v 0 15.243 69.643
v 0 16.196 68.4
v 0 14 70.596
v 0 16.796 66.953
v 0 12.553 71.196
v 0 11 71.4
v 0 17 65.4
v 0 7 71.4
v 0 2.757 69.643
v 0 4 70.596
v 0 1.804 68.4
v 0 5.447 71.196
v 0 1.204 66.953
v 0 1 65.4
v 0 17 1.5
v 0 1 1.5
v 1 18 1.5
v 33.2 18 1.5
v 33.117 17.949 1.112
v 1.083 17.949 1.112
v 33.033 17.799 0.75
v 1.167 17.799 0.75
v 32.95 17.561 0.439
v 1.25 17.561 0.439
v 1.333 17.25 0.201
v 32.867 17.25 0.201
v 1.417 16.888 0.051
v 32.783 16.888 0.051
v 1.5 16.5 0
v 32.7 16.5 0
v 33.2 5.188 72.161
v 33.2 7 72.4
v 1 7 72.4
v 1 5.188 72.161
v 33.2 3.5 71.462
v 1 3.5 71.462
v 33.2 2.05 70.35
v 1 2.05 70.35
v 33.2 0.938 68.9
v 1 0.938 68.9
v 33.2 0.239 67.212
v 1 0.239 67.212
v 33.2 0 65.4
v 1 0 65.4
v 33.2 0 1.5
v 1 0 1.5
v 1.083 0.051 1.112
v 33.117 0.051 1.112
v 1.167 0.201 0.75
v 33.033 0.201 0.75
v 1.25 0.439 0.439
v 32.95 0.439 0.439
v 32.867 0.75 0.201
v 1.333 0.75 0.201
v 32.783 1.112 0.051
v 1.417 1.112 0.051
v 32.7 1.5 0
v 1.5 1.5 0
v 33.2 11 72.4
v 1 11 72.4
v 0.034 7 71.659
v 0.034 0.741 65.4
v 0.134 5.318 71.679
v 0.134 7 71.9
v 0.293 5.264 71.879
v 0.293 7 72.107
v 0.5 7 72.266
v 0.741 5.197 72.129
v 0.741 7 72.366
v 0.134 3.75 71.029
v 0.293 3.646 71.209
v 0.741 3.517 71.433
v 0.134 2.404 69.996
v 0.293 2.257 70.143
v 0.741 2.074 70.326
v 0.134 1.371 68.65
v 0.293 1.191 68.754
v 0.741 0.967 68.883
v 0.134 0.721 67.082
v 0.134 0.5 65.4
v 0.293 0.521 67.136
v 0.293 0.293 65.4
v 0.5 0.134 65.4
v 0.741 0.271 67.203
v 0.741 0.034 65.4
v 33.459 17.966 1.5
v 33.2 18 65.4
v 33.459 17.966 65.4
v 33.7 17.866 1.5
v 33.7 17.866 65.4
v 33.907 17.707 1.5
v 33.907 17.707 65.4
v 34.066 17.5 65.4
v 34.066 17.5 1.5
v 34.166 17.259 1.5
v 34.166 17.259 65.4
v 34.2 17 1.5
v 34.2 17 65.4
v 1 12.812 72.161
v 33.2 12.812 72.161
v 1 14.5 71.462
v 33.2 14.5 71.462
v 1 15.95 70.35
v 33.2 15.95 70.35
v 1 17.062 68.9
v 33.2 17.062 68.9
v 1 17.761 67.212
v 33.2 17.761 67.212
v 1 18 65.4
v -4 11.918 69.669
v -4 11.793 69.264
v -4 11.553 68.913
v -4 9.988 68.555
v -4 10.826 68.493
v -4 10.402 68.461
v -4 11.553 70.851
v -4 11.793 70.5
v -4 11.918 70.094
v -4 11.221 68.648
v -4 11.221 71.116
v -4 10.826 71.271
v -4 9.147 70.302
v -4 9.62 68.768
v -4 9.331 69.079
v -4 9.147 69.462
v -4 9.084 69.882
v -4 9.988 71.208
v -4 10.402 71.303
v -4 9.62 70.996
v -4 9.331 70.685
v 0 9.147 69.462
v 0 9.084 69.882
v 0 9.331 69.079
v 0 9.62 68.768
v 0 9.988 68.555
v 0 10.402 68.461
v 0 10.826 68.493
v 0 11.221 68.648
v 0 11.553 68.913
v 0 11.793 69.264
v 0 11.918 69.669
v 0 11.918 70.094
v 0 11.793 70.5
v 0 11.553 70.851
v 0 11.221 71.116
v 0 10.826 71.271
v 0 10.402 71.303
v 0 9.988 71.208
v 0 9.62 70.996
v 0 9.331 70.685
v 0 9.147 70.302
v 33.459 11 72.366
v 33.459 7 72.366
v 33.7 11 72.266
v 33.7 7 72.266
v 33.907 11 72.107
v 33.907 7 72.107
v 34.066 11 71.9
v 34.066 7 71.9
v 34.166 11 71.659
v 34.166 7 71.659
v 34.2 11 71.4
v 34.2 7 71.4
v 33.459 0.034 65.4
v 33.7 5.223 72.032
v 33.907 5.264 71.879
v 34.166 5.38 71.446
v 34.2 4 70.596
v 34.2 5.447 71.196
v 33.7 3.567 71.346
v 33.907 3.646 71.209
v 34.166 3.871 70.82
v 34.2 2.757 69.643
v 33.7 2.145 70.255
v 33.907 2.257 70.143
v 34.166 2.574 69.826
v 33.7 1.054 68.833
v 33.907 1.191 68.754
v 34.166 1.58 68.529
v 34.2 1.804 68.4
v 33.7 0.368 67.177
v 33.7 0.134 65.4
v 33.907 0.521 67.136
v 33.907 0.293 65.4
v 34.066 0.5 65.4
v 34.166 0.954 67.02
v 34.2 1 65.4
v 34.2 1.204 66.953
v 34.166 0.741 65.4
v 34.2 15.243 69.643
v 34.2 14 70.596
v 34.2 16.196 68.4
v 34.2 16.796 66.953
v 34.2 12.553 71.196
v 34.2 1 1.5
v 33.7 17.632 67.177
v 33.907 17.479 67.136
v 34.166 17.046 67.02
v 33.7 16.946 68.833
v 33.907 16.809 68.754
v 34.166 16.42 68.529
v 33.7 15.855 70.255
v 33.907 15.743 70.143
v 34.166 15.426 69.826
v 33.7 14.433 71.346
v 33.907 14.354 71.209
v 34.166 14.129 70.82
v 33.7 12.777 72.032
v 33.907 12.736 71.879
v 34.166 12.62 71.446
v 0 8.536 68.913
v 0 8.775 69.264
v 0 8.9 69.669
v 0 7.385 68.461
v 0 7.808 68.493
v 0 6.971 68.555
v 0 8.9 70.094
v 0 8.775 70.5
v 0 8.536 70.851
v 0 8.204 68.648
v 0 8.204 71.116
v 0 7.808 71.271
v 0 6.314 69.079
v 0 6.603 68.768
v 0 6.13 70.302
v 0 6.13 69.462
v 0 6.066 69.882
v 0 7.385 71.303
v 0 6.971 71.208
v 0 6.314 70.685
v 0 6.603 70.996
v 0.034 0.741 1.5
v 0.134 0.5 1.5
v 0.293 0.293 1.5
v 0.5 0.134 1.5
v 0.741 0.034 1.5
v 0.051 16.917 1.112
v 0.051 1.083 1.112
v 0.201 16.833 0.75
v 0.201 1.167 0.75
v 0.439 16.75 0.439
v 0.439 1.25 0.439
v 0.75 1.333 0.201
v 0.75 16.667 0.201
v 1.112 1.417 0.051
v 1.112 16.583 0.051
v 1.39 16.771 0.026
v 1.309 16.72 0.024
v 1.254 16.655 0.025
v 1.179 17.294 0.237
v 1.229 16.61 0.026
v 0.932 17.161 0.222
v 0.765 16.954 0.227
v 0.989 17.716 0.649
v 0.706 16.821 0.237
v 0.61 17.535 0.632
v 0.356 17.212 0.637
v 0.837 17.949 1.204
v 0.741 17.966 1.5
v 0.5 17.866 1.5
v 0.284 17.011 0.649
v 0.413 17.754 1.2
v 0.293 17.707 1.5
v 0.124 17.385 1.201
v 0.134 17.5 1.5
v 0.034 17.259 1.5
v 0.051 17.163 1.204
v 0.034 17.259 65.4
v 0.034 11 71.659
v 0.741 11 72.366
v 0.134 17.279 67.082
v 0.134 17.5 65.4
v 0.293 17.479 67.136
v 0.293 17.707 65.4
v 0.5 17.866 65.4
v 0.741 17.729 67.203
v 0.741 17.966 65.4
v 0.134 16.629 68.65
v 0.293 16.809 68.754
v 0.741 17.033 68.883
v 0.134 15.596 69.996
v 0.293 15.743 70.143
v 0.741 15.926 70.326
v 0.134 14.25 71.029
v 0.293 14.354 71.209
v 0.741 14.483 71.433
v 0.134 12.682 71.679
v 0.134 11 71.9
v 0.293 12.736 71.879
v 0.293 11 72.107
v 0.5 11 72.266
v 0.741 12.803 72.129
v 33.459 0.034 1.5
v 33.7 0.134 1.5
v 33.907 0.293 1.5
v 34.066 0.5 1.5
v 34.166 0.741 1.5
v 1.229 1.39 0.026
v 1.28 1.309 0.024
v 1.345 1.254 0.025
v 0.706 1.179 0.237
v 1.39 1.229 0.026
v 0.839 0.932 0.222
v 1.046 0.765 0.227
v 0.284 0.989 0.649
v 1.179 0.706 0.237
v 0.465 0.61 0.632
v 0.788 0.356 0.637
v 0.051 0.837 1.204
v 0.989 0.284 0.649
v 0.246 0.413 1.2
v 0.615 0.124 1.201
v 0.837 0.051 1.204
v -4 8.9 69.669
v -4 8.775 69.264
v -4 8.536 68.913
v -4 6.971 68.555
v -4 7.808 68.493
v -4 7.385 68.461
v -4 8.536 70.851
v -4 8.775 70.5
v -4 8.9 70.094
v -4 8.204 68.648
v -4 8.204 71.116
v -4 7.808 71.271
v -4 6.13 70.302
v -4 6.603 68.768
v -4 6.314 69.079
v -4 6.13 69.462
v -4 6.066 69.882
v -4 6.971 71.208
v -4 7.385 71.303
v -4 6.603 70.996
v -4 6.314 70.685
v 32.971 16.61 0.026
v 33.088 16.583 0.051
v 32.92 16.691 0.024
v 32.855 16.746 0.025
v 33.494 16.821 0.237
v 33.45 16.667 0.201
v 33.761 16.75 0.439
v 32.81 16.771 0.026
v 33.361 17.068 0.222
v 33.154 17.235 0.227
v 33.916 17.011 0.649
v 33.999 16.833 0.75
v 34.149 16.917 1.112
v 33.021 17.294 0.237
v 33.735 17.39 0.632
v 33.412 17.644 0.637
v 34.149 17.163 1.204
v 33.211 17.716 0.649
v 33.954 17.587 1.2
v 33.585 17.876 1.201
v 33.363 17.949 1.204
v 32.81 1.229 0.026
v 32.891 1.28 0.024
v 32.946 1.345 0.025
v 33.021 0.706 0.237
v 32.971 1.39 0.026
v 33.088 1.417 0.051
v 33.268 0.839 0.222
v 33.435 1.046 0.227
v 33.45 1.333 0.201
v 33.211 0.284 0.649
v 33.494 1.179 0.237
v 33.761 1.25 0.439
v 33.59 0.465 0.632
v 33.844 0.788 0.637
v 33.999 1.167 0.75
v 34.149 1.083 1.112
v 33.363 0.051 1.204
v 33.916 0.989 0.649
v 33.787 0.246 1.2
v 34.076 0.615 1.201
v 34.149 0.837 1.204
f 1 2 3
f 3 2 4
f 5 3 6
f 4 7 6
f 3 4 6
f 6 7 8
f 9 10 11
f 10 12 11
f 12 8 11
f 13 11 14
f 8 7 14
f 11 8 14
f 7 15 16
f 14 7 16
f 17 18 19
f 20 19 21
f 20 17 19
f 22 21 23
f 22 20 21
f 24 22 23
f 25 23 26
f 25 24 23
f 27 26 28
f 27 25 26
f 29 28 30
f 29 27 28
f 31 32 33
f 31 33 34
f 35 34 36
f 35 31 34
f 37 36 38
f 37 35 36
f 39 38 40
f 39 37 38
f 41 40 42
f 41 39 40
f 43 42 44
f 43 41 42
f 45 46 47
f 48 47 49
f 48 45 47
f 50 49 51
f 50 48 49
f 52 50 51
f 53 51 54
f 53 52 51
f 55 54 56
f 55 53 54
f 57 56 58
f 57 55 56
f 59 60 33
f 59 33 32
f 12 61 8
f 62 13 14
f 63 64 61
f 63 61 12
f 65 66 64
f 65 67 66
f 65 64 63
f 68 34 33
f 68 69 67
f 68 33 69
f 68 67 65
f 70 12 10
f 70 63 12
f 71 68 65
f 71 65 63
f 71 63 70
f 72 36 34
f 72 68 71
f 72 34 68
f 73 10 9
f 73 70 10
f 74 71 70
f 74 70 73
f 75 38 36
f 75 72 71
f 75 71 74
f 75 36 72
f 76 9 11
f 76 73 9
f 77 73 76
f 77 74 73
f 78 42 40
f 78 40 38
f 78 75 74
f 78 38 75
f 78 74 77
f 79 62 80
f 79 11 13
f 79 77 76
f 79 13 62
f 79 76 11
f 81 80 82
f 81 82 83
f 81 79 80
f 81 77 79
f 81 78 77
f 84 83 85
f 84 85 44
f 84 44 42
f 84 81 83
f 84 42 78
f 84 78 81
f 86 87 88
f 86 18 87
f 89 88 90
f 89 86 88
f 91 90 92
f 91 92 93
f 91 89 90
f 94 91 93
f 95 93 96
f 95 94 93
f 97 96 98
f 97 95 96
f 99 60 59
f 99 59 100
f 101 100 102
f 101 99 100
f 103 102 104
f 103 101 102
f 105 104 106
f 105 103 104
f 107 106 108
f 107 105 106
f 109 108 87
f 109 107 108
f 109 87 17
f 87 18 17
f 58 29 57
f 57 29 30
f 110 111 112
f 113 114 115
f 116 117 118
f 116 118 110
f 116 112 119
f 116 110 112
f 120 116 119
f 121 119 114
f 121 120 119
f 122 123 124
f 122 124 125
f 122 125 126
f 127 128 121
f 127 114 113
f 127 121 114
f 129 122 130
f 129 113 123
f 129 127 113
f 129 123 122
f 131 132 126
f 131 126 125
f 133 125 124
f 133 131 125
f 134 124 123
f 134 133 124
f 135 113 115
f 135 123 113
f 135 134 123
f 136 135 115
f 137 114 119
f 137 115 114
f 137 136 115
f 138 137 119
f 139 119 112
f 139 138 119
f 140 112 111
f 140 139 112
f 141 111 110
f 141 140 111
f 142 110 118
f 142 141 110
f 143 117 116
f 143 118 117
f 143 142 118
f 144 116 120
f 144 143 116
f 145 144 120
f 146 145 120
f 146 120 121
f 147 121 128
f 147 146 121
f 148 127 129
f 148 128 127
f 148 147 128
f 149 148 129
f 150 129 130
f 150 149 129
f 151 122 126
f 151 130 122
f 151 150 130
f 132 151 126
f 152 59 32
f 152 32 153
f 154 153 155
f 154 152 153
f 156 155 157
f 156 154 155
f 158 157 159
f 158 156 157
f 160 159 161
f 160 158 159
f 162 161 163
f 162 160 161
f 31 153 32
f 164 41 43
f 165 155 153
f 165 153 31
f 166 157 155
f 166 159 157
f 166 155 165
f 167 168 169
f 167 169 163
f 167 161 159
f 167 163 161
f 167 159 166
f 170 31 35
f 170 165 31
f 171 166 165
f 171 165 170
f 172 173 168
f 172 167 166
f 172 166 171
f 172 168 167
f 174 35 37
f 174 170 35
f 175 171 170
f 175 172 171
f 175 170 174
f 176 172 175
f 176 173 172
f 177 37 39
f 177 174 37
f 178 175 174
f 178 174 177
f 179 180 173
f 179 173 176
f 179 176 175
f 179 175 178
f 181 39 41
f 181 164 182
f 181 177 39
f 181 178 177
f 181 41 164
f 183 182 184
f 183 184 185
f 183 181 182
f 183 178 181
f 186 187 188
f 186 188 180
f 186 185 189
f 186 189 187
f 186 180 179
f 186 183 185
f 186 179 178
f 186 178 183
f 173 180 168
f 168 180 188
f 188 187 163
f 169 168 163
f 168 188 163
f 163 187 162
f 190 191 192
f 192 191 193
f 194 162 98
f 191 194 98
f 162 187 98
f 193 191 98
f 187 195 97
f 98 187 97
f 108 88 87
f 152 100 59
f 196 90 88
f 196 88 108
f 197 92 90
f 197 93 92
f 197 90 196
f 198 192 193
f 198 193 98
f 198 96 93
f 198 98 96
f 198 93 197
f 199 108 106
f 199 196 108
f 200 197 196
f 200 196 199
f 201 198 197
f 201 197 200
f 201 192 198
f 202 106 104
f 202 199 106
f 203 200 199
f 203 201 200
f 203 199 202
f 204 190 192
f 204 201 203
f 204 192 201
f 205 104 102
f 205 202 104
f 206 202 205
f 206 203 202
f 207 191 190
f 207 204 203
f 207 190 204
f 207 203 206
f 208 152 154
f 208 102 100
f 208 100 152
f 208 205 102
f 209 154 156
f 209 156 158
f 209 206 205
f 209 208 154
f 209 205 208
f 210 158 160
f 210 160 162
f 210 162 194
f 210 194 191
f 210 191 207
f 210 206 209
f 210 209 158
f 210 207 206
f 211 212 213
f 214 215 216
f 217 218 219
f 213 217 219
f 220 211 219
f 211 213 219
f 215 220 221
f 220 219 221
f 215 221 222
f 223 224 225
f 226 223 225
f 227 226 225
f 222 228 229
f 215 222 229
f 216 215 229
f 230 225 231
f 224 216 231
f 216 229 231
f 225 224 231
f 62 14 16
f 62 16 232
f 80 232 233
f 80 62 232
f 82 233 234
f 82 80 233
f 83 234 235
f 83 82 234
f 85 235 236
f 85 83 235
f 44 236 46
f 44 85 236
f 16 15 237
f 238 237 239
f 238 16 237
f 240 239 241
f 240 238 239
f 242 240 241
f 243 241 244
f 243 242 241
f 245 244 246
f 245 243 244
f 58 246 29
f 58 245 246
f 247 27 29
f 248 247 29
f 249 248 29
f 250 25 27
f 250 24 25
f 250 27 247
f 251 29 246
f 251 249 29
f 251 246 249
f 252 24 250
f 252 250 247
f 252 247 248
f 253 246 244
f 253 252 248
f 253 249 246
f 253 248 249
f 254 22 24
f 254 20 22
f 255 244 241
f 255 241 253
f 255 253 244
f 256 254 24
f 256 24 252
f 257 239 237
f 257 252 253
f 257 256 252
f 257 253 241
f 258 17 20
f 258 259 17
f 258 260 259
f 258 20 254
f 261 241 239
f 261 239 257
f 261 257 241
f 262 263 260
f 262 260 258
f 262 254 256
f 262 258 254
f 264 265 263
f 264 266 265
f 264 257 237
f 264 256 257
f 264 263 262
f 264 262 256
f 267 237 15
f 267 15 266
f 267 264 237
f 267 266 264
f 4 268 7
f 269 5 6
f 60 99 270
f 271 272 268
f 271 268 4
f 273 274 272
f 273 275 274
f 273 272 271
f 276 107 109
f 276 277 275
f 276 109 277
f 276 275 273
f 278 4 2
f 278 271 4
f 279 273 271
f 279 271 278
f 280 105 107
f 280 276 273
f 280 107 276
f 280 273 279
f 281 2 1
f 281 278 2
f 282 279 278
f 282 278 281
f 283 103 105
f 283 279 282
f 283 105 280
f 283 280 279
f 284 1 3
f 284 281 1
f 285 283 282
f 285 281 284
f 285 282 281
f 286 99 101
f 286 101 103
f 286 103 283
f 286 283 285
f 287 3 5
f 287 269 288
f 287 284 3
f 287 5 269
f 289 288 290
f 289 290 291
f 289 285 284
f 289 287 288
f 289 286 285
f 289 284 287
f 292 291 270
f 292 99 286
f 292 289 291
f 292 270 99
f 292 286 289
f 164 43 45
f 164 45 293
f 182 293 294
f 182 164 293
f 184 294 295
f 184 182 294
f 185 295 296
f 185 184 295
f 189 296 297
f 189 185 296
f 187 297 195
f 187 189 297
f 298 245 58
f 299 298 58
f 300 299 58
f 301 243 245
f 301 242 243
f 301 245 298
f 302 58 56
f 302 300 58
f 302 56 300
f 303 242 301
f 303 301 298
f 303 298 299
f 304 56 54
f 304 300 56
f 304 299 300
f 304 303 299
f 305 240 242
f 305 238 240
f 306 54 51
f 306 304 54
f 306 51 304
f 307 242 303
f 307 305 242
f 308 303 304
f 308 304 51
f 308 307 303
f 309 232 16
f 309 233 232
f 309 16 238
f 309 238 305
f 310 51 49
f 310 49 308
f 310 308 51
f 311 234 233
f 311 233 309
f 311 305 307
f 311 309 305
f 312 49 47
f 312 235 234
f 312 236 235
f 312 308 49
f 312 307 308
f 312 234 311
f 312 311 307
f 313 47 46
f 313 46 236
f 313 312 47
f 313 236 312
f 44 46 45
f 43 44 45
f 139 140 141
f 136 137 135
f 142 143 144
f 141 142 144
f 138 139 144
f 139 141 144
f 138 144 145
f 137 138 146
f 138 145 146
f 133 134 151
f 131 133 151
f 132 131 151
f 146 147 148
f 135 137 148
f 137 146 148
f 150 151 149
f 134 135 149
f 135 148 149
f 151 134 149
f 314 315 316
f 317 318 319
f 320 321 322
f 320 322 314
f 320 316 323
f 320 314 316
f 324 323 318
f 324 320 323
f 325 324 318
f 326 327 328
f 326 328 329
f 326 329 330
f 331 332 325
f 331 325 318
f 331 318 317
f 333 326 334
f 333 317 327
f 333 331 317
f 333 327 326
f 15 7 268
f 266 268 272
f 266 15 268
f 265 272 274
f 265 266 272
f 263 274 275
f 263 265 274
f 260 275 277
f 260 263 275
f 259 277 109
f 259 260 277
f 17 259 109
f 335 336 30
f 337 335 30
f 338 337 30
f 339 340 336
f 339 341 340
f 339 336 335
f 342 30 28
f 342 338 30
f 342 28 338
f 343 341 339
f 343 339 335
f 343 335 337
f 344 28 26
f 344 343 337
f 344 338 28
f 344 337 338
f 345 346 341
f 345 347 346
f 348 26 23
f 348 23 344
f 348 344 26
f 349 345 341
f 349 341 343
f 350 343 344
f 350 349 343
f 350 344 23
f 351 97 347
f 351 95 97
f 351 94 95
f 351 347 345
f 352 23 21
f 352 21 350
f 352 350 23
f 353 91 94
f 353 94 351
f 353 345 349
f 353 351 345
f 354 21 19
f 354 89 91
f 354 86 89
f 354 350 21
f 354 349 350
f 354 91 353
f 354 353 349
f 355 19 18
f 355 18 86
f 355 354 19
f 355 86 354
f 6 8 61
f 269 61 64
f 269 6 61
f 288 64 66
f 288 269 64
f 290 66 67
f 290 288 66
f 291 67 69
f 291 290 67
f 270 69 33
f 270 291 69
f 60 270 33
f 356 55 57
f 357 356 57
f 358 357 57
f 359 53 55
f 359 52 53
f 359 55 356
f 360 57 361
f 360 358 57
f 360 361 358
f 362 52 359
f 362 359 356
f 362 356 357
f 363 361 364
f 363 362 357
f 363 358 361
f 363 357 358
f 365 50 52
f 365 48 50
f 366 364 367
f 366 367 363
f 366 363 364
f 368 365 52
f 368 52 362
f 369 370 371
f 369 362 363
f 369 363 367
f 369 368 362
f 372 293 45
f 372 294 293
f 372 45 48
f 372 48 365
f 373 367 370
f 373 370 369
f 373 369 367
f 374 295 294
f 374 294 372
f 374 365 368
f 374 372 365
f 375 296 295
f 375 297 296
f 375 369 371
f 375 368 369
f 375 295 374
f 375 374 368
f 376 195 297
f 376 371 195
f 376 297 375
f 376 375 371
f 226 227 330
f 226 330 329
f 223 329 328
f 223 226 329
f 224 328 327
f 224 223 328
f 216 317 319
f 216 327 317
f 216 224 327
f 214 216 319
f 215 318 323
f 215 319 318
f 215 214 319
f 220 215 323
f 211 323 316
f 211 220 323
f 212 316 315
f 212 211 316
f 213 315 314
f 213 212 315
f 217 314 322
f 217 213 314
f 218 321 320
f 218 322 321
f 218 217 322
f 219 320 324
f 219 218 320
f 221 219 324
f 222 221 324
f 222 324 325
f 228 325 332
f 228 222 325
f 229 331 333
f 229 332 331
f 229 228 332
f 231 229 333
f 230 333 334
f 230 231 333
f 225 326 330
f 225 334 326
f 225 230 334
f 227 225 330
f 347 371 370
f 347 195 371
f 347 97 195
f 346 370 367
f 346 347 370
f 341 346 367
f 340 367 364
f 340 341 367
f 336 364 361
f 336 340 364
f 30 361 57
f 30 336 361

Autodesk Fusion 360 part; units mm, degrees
sketch "Sketch1" plane through (0, 0, 0) normal (0, 0, 1) x (1, 0, 0)
  line L0 (0, 0) -> (34.2, 0)
  line L1 (34.2, 0) -> (34.2, 18)
  line L2 (34.2, 18) -> (0, 18)
  line L3 (0, 18) -> (0, 0)
  dimension "d1" = 34.2
  dimension "d2" = 18
extrude "Extrude1" add sketch "Sketch1" along normal blind 72.4 makes body 1
fillet "Fillet1" radius 7 2 edges at (17.1, 18, 72.4) (17.1, 0, 72.4) on bodies 1
fillet "Fillet2" radius 1 10 edges at (0, 0, 32.7) (0, 2.0503, 70.3497) (0, 9, 72.4) (0, 15.9497, 70.3497) (0, 18, 32.7) (34.2, 0, 32.7) (34.2, 2.0503, 70.3497) (34.2, 9, 72.4) (34.2, 15.9497, 70.3497) (34.2, 18, 32.7) on bodies 1
fillet "Fillet3" radius 1.5 8 edges at (34.2, 9, 0) (33.9071, 17.7071, 0) (17.1, 18, 0) (0.2929, 17.7071, 0) (0, 9, 0) (0.2929, 0.2929, 0) (17.1, 0, 0) (33.9071, 0.2929, 0) on bodies 1
sketch "Sketch2" plane through (0, 0, 0) normal (-1, 0, 0) x (0, -1, 0)
  line L0 (-17, 1.5) -> (-1, 1.5)
  line L1 (-1, 1.5) -> (-1, 65.4)
  arc A0 (-1, 65.4) -> (-7, 71.4) centre (-7, 65.4) ccw
  line L2 (-7, 71.4) -> (-11, 71.4)
  arc A1 (-11, 71.4) -> (-17, 65.4) centre (-11, 65.4) ccw
  line L3 (-17, 65.4) -> (-17, 1.5)
  line L4 (-7, 71.4) -> (-7, 72.4)
  arc A2 (-1, 65.4) -> (-7, 71.4) centre (-7, 65.4) ccw
  line L5 (-1, 65.4) -> (0, 65.4)
  arc A3 (0, 65.4) -> (-7, 72.4) centre (-7, 65.4) ccw
  line L6 (-11, 71.4) -> (-11, 72.4)
  line L7 (-11, 71.4) -> (-7, 71.4)
  line L8 (-7, 71.4) -> (-7, 72.4)
  line L9 (-7, 72.4) -> (-11, 72.4)
  line L10 (-17, 65.4) -> (-18, 65.4)
  arc A4 (-11, 71.4) -> (-17, 65.4) centre (-11, 65.4) ccw
  line L11 (-11, 71.4) -> (-11, 72.4)
  arc A5 (-11, 72.4) -> (-18, 65.4) centre (-11, 65.4) ccw
  circle A6 centre (-7.4912, 69.8818) radius 1.425
  circle A7 centre (-10.5088, 69.8818) radius 1.425
  dimension "d11" = 2.85
extrude "Extrude2" add sketch "Sketch2" along normal blind 4 separate body contours A6 makes body 2
extrude "Extrude3" add sketch "Sketch2" along normal blind 4 separate body contours A7 makes body 3
sketch "Sketch3" plane through (0, 0, 0) normal (0, 0, -1) x (1, 0, 0)
  line L0 (32.7, -16.5) -> (32.7, -1.5)
  line L1 (32.7, -1.5) -> (1.5, -1.5)
  line L2 (1.5, -1.5) -> (1.5, -16.5)
  line L3 (1.5, -16.5) -> (32.7, -16.5)
  line L4 (33.2, 0) -> (1, 0)
  line L5 (34.2, -17) -> (34.2, -1)
  line L6 (1, -18) -> (33.2, -18)
  line L7 (0, -1) -> (0, -17)
  line L8 (0, -1) -> (0, 0)
  line L9 (0, 0) -> (1, 0)
  line L10 (33.2, -18) -> (34.2, -18)
  line L11 (34.2, -17) -> (34.2, -18)
  line L12 (0, 0) -> (34.2, 0)
  line L13 (34.2, 0) -> (34.2, -18)
  line L14 (34.2, -18) -> (0, -18)
  line L15 (0, -18) -> (0, 0)
